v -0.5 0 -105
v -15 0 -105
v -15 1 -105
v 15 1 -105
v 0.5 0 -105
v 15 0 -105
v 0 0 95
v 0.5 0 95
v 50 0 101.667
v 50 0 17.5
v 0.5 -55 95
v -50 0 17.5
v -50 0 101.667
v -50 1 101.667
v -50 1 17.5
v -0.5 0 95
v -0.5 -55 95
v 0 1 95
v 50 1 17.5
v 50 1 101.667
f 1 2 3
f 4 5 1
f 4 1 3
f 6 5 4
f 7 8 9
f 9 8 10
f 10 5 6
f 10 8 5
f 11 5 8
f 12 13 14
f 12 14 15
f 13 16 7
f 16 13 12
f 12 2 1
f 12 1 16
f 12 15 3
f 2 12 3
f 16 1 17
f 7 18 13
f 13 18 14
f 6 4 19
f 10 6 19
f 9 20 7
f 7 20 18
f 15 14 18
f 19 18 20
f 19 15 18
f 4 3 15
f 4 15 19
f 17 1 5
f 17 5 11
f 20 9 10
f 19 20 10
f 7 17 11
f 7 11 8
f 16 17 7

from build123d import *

# Parameters (mm, degrees)
SKETCH_1_W           = 100
SKETCH_1_H           = 210
EXTRUDE_1_DEPTH      = 1
CUT_EXTRUDE_1_DEPTH  = 1
EXTRUDE_2_DEPTH      = 0.5
EXTRUDE_2_DEPTH_BACK = 0.5


with BuildPart() as part:
    # ｽｹｯﾁ1 → ﾎﾞｽ - 押し出し1 (new body)
    with BuildSketch(Plane(origin=(0, 0, 0), x_dir=(1, 0, 0), z_dir=(0, 1, 0))):
        Rectangle(SKETCH_1_W, SKETCH_1_H)
    extrude(amount=EXTRUDE_1_DEPTH)

    # ｽｹｯﾁ2 → ｶｯﾄ - 押し出し1 (cut)
    with BuildSketch(Plane(origin=(0, 1, 0), x_dir=(1, 0, 0), z_dir=(0, 1, 0))):
        Polygon((15, 105), (50, -17.5), (50, 105), align=None)
        Polygon((-50, 105), (-50, -17.5), (-15, 105), align=None)
        Polygon((50, -105), (50, -101.666666667), (0, -95), (-50, -101.666666667), (-50, -105), align=None)
    extrude(amount=-CUT_EXTRUDE_1_DEPTH, mode=Mode.SUBTRACT)

    # ｽｹｯﾁ4 → ﾎﾞｽ - 押し出し2 (add, two sides: drawn at the far end of the back side and taken through both)
    with BuildSketch(Plane(origin=(0, 0, 0), x_dir=(0, 0, -1), z_dir=(1, 0, 0)).offset(-EXTRUDE_2_DEPTH_BACK)):
        Polygon((105, 0), (-95, -55), (-95, 0), align=None)
    extrude(amount=EXTRUDE_2_DEPTH + EXTRUDE_2_DEPTH_BACK)


solid = part.part
